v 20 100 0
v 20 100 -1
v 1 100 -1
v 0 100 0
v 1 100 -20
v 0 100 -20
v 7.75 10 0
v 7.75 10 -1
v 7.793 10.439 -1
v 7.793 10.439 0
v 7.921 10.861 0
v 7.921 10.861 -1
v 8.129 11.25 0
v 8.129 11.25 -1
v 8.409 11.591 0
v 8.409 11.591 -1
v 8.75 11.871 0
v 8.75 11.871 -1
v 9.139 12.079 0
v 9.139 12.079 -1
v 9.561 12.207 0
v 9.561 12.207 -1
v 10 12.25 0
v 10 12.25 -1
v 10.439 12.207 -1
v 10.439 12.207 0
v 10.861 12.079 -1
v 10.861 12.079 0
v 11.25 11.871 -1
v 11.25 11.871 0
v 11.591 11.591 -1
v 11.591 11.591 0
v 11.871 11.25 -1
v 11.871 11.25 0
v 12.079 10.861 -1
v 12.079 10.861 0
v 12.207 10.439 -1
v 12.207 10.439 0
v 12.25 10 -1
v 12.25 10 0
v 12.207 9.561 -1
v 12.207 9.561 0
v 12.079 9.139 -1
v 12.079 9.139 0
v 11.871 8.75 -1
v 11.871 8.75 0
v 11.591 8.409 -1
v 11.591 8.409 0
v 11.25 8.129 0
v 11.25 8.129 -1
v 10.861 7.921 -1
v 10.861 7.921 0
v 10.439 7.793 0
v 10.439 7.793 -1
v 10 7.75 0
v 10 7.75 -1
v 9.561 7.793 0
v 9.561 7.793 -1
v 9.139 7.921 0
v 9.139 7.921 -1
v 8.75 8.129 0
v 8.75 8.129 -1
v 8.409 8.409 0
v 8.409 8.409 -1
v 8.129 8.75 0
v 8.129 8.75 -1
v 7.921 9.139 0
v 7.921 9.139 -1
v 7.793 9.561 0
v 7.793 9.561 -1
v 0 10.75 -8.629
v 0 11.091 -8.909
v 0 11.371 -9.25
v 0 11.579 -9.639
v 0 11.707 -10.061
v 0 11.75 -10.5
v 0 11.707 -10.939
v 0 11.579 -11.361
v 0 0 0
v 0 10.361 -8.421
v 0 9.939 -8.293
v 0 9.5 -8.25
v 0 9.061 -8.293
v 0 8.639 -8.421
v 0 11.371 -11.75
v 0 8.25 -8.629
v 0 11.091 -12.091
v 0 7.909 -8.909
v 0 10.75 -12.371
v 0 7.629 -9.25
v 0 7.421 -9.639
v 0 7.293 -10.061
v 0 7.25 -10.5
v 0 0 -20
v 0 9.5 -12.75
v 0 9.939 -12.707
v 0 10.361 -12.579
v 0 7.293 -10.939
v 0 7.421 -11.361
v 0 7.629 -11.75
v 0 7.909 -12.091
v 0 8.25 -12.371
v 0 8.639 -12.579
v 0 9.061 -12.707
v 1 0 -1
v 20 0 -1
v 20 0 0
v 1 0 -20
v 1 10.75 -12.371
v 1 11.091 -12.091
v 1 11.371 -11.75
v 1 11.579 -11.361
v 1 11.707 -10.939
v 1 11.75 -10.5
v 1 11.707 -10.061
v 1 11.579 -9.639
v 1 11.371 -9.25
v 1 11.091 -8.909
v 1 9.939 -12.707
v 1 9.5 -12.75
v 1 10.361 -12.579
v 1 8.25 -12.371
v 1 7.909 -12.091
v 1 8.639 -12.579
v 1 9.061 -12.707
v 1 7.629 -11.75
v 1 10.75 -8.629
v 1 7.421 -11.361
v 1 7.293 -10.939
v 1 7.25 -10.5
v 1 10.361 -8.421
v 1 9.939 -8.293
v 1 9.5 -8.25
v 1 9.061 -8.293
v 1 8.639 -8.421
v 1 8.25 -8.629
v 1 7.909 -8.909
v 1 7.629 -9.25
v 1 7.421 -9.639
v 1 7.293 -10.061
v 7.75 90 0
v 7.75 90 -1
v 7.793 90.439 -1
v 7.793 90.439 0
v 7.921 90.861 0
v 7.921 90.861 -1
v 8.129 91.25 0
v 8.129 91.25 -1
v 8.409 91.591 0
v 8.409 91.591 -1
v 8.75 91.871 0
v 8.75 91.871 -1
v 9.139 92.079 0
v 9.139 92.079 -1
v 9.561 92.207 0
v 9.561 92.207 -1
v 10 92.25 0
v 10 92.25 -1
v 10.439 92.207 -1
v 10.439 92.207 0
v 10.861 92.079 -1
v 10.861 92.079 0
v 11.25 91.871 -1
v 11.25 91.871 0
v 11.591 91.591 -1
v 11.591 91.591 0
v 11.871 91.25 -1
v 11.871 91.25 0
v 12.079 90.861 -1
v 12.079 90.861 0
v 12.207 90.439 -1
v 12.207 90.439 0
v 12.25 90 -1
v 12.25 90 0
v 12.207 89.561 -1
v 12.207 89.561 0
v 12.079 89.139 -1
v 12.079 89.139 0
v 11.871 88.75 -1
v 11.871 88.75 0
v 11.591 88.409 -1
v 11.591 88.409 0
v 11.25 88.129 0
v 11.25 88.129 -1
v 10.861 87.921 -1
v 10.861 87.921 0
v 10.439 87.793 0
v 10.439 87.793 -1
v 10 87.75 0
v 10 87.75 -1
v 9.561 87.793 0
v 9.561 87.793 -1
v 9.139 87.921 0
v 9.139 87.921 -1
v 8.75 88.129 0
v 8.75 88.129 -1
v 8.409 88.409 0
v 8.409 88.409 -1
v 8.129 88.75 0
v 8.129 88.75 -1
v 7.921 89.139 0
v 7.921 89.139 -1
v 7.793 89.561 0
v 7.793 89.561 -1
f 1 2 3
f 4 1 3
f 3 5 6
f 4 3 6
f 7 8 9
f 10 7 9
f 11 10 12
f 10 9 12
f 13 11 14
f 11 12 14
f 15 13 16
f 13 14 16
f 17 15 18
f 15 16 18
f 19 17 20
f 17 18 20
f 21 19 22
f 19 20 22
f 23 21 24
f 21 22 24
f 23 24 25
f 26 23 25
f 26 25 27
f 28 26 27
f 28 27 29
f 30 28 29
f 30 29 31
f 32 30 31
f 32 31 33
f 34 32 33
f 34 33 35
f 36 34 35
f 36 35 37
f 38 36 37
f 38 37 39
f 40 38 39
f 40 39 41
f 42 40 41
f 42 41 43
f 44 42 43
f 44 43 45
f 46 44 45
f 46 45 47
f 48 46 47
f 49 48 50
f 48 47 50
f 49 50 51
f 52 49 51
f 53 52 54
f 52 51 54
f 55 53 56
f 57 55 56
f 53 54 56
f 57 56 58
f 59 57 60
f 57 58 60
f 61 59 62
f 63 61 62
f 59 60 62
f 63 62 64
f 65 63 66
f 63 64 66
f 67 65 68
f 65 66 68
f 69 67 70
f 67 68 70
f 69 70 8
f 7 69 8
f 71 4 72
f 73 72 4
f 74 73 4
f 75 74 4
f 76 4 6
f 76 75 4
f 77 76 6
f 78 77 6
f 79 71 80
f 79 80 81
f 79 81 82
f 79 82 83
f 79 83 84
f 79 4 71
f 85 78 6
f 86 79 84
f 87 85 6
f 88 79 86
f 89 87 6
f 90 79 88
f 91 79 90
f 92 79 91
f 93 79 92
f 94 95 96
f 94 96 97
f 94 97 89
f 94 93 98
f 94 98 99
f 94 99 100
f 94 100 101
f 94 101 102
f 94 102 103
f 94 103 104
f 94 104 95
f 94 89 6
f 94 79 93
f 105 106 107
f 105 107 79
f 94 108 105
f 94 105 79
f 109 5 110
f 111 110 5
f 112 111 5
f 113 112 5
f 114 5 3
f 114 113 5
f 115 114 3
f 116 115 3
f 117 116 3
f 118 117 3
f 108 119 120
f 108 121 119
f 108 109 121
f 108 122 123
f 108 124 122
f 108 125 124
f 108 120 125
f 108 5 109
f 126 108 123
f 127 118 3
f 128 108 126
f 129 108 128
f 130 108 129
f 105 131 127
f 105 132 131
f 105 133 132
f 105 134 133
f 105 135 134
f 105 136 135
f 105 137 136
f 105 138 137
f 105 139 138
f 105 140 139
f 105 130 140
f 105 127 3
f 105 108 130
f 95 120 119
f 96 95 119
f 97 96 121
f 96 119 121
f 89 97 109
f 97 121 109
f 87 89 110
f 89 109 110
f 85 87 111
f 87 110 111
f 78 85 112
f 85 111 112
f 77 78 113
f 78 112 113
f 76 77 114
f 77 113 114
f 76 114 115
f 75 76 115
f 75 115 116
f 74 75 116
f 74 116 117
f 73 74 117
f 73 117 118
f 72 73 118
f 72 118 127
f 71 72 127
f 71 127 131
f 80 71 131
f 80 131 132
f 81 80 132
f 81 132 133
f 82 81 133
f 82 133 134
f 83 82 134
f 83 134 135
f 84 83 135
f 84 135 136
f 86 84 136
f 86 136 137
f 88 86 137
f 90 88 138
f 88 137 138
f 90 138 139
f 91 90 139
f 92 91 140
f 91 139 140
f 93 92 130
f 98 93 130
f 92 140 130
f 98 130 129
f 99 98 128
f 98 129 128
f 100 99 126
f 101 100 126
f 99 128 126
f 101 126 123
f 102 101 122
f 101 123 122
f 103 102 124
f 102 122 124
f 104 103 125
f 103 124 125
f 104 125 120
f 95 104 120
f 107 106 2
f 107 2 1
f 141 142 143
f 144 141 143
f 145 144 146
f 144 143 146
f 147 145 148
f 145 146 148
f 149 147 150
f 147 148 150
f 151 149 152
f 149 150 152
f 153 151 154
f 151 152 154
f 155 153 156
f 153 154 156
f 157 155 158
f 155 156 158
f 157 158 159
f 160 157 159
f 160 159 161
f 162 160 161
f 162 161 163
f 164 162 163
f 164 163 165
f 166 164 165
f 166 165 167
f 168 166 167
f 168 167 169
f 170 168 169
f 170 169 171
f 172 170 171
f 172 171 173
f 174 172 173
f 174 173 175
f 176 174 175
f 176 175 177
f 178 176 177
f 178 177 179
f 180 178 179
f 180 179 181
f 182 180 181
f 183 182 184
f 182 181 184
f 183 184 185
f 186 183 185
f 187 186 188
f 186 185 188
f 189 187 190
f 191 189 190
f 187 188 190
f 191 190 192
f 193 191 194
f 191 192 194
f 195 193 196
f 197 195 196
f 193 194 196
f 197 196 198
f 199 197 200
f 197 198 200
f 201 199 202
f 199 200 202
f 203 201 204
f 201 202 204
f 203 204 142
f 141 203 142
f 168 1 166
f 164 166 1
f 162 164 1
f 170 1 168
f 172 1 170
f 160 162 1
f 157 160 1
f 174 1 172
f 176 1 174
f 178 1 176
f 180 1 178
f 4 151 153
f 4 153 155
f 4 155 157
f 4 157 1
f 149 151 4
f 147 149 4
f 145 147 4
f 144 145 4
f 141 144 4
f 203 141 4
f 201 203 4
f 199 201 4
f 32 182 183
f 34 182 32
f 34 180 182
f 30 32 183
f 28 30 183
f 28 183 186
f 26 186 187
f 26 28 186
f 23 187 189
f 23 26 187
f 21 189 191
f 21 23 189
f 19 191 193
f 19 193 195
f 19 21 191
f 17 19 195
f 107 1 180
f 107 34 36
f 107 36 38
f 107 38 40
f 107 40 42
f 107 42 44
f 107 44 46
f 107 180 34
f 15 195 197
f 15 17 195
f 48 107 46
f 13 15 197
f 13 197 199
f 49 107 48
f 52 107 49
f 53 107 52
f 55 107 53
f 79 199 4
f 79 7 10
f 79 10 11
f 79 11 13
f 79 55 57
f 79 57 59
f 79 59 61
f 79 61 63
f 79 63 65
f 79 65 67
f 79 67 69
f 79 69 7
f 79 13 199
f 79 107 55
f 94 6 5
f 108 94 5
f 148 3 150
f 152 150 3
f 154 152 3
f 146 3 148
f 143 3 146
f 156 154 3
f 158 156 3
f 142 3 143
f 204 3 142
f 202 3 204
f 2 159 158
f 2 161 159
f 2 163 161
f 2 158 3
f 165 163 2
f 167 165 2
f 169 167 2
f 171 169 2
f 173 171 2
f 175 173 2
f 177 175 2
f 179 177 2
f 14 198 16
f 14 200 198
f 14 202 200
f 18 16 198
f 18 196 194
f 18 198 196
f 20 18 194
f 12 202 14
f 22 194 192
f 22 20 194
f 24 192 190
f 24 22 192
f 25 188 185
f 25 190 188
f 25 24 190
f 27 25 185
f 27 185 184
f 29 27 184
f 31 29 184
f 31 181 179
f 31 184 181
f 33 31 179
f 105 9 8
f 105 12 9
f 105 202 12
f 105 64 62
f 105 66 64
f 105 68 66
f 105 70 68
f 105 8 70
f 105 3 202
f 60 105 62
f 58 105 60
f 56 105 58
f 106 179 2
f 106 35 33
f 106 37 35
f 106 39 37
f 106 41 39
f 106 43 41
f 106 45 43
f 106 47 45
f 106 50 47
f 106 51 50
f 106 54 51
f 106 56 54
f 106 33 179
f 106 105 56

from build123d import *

# Parameters (mm, degrees)
EXTRUDE_1_DEPTH     = 100
SKETCH_2_R          = 2.25
CUT_EXTRUDE_1_DEPTH = 2
SKETCH_3_R          = 2.25
CUT_EXTRUDE_2_DEPTH = 2


with BuildPart() as part:
    # Эскиз1 → Бобышка-Вытянуть1 (new body)
    with BuildSketch(Plane(origin=(0, 0, 0), x_dir=(1, 0, 0), z_dir=(0, 1, 0))):
        Polygon((0, 0), (0, 20), (1, 20), (1, 1), (20, 1), (20, 0), align=None)
    extrude(amount=EXTRUDE_1_DEPTH)

    # Эскиз2 → Вырез-Вытянуть1 (cut, through all)
    with BuildSketch(Plane(origin=(0, 0, -1), x_dir=(-1, 0, 0), z_dir=(0, 0, -1))):
        with Locations((-10, 10)):
            Circle(SKETCH_2_R)
        with Locations((-10, 90)):
            Circle(SKETCH_2_R)
    extrude(amount=-CUT_EXTRUDE_1_DEPTH, mode=Mode.SUBTRACT)

    # Эскиз3 → Вырез-Вытянуть2 (cut, through all)
    with BuildSketch(Plane(origin=(1, 0, 0), x_dir=(0, 0, -1), z_dir=(1, 0, 0))):
        with Locations((10.5, 9.5)):
            Circle(SKETCH_3_R)
    extrude(amount=-CUT_EXTRUDE_2_DEPTH, mode=Mode.SUBTRACT)


solid = part.part
